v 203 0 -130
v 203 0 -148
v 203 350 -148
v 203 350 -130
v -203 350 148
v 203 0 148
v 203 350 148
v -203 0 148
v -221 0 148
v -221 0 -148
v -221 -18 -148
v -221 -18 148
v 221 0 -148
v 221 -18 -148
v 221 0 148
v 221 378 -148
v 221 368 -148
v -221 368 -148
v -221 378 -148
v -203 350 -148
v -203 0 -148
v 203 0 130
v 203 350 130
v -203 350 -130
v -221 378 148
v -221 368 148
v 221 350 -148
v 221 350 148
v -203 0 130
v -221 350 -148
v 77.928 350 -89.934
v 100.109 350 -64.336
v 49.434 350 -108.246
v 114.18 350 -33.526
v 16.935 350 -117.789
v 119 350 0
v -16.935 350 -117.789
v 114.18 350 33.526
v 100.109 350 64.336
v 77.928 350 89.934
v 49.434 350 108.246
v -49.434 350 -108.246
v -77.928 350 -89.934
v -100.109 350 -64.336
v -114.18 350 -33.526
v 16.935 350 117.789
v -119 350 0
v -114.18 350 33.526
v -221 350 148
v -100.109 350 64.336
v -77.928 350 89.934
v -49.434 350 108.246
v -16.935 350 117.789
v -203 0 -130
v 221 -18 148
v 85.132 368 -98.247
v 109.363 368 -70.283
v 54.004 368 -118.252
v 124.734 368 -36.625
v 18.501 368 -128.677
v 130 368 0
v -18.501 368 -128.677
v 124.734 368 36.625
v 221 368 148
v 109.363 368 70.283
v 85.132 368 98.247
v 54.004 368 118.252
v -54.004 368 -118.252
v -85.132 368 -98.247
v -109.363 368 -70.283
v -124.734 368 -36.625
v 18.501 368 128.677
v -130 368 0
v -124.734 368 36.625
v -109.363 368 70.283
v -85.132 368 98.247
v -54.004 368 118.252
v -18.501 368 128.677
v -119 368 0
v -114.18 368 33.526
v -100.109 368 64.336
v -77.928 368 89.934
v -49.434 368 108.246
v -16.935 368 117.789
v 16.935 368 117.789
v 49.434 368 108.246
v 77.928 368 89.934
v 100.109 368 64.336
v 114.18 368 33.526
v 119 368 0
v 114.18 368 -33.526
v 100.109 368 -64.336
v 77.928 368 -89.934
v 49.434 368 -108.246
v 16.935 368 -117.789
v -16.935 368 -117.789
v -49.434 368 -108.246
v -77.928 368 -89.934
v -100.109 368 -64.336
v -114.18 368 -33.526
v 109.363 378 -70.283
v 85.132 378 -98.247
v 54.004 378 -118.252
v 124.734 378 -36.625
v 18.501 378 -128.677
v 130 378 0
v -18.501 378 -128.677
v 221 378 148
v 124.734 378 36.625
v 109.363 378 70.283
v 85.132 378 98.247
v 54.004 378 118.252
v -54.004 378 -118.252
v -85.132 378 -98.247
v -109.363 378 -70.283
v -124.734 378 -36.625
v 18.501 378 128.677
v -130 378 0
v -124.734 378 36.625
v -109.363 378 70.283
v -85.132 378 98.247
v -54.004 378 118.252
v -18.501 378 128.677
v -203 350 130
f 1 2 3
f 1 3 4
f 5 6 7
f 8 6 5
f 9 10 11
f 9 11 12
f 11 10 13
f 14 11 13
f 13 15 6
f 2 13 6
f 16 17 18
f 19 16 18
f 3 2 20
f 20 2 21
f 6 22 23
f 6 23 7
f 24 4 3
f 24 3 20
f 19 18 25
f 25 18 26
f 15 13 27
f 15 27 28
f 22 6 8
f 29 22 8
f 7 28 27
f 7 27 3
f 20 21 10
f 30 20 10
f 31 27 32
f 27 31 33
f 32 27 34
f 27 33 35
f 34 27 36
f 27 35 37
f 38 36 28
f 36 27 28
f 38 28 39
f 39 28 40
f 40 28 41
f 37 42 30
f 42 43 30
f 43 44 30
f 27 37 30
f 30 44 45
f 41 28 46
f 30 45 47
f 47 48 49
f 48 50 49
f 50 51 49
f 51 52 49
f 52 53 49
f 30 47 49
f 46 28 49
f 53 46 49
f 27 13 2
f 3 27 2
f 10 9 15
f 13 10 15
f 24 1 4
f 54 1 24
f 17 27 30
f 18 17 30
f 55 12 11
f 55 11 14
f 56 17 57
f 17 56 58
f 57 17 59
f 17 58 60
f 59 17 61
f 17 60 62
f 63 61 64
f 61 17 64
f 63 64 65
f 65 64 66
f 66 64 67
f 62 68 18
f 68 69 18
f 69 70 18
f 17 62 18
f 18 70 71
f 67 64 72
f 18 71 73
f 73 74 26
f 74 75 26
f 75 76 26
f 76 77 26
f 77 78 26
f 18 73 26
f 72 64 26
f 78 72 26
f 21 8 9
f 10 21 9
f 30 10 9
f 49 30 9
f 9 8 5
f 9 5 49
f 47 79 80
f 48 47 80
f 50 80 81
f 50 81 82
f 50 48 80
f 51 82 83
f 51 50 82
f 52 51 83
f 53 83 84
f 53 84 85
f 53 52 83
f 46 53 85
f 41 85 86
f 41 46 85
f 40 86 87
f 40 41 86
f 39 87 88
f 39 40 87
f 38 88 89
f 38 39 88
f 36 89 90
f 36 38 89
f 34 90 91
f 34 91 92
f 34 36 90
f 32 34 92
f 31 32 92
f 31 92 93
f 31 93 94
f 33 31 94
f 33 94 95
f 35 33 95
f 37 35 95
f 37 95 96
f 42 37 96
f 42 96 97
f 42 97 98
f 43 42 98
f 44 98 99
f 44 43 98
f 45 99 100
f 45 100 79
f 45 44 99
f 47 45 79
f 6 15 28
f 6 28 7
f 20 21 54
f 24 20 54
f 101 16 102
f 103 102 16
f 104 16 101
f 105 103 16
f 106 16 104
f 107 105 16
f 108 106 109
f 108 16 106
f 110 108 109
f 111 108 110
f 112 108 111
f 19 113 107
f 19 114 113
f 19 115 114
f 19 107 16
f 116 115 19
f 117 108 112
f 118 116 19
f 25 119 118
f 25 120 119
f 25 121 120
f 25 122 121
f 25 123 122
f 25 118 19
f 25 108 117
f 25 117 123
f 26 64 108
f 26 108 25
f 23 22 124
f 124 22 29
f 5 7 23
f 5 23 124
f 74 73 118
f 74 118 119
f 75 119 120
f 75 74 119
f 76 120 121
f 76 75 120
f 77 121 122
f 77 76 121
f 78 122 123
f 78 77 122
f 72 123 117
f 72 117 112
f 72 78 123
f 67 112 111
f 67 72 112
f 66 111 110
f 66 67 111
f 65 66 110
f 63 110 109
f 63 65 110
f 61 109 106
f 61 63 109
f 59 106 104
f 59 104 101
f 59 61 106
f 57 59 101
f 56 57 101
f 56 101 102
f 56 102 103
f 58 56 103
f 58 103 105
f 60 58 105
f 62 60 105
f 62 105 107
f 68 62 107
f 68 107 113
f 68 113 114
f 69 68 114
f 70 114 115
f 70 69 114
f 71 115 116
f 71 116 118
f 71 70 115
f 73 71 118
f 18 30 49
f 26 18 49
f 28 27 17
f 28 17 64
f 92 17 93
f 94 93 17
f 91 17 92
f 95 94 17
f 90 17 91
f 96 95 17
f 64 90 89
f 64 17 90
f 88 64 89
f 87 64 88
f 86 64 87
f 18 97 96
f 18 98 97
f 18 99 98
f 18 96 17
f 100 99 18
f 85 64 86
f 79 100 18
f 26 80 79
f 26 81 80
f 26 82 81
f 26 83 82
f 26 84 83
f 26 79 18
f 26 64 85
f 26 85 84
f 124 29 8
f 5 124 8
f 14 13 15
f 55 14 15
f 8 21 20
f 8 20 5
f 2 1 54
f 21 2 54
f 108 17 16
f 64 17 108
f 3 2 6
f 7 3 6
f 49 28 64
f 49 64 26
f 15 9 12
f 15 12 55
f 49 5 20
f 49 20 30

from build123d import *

# Parameters (mm, degrees)
F0_W      = 442
F0_H      = 296
F1_DEPTH  = 18
F2_W      = 18
F2_H      = 296
F3_DEPTH  = 350
F4_W      = 18
F4_H      = 296
F5_DEPTH  = 350
F6_W      = 406
F6_H      = 18
F8_DEPTH  = 350
F7_W      = 406
F7_H      = 18
F9_DEPTH  = 350
F10_W     = 442
F10_H     = 296
F10_R     = 119
F11_DEPTH = 18
F14_W     = 442
F14_H     = 296
F14_R     = 130
F15_DEPTH = 10


with BuildPart() as f1:
    # F0 (on Front) → F1 (new body)
    with BuildSketch(Plane.XZ):
        Rectangle(F0_W, F0_H)
    extrude(amount=F1_DEPTH)


with BuildPart() as f3:
    # F2 (on face) → F3 (new body)
    with BuildSketch(Plane(origin=(0, 0, 0), x_dir=(-1, 0, 0), z_dir=(0, 1, 0))):
        with Locations((-212, 0)):
            Rectangle(F2_W, F2_H)
    extrude(amount=F3_DEPTH)


with BuildPart() as f5:
    # F4 (on face) → F5 (new body)
    with BuildSketch(Plane(origin=(0, 0, 0), x_dir=(-1, 0, 0), z_dir=(0, 1, 0))):
        with Locations((212, 0)):
            Rectangle(F4_W, F4_H)
    extrude(amount=F5_DEPTH)


with BuildPart() as f8:
    # F6 (on face) → F8 (new body)
    with BuildSketch(Plane(origin=(0, 0, 0), x_dir=(-1, 0, 0), z_dir=(0, 1, 0))):
        with Locations((0, 139)):
            Rectangle(F6_W, F6_H)
    extrude(amount=F8_DEPTH)


with BuildPart() as f9:
    # F7 (on face) → F9 (new body)
    with BuildSketch(Plane(origin=(0, 0, 0), x_dir=(-1, 0, 0), z_dir=(0, 1, 0))):
        with Locations((0, -139)):
            Rectangle(F7_W, F7_H)
    extrude(amount=F9_DEPTH)


with BuildPart() as f11:
    # F10 (on face) → F11 (new body)
    with BuildSketch(Plane(origin=(0, 350, 0), x_dir=(-1, 0, 0), z_dir=(0, 1, 0))):
        Rectangle(F10_W, F10_H)
        Circle(F10_R, mode=Mode.SUBTRACT)
    extrude(amount=F11_DEPTH)


with BuildPart() as f12_1:
    # F12: copy of F11
    add(f11.part.moved(Location((0, 18, 0))))


with BuildPart() as f15:
    # F14 (on face) → F15 (new body)
    with BuildSketch(Plane(origin=(0, 368, 0), x_dir=(-1, 0, 0), z_dir=(0, 1, 0))):
        Rectangle(F14_W, F14_H)
        Circle(F14_R, mode=Mode.SUBTRACT)
    extrude(amount=F15_DEPTH)


solid = Compound([f1.part, f3.part, f5.part, f8.part, f9.part, f11.part, f15.part])
